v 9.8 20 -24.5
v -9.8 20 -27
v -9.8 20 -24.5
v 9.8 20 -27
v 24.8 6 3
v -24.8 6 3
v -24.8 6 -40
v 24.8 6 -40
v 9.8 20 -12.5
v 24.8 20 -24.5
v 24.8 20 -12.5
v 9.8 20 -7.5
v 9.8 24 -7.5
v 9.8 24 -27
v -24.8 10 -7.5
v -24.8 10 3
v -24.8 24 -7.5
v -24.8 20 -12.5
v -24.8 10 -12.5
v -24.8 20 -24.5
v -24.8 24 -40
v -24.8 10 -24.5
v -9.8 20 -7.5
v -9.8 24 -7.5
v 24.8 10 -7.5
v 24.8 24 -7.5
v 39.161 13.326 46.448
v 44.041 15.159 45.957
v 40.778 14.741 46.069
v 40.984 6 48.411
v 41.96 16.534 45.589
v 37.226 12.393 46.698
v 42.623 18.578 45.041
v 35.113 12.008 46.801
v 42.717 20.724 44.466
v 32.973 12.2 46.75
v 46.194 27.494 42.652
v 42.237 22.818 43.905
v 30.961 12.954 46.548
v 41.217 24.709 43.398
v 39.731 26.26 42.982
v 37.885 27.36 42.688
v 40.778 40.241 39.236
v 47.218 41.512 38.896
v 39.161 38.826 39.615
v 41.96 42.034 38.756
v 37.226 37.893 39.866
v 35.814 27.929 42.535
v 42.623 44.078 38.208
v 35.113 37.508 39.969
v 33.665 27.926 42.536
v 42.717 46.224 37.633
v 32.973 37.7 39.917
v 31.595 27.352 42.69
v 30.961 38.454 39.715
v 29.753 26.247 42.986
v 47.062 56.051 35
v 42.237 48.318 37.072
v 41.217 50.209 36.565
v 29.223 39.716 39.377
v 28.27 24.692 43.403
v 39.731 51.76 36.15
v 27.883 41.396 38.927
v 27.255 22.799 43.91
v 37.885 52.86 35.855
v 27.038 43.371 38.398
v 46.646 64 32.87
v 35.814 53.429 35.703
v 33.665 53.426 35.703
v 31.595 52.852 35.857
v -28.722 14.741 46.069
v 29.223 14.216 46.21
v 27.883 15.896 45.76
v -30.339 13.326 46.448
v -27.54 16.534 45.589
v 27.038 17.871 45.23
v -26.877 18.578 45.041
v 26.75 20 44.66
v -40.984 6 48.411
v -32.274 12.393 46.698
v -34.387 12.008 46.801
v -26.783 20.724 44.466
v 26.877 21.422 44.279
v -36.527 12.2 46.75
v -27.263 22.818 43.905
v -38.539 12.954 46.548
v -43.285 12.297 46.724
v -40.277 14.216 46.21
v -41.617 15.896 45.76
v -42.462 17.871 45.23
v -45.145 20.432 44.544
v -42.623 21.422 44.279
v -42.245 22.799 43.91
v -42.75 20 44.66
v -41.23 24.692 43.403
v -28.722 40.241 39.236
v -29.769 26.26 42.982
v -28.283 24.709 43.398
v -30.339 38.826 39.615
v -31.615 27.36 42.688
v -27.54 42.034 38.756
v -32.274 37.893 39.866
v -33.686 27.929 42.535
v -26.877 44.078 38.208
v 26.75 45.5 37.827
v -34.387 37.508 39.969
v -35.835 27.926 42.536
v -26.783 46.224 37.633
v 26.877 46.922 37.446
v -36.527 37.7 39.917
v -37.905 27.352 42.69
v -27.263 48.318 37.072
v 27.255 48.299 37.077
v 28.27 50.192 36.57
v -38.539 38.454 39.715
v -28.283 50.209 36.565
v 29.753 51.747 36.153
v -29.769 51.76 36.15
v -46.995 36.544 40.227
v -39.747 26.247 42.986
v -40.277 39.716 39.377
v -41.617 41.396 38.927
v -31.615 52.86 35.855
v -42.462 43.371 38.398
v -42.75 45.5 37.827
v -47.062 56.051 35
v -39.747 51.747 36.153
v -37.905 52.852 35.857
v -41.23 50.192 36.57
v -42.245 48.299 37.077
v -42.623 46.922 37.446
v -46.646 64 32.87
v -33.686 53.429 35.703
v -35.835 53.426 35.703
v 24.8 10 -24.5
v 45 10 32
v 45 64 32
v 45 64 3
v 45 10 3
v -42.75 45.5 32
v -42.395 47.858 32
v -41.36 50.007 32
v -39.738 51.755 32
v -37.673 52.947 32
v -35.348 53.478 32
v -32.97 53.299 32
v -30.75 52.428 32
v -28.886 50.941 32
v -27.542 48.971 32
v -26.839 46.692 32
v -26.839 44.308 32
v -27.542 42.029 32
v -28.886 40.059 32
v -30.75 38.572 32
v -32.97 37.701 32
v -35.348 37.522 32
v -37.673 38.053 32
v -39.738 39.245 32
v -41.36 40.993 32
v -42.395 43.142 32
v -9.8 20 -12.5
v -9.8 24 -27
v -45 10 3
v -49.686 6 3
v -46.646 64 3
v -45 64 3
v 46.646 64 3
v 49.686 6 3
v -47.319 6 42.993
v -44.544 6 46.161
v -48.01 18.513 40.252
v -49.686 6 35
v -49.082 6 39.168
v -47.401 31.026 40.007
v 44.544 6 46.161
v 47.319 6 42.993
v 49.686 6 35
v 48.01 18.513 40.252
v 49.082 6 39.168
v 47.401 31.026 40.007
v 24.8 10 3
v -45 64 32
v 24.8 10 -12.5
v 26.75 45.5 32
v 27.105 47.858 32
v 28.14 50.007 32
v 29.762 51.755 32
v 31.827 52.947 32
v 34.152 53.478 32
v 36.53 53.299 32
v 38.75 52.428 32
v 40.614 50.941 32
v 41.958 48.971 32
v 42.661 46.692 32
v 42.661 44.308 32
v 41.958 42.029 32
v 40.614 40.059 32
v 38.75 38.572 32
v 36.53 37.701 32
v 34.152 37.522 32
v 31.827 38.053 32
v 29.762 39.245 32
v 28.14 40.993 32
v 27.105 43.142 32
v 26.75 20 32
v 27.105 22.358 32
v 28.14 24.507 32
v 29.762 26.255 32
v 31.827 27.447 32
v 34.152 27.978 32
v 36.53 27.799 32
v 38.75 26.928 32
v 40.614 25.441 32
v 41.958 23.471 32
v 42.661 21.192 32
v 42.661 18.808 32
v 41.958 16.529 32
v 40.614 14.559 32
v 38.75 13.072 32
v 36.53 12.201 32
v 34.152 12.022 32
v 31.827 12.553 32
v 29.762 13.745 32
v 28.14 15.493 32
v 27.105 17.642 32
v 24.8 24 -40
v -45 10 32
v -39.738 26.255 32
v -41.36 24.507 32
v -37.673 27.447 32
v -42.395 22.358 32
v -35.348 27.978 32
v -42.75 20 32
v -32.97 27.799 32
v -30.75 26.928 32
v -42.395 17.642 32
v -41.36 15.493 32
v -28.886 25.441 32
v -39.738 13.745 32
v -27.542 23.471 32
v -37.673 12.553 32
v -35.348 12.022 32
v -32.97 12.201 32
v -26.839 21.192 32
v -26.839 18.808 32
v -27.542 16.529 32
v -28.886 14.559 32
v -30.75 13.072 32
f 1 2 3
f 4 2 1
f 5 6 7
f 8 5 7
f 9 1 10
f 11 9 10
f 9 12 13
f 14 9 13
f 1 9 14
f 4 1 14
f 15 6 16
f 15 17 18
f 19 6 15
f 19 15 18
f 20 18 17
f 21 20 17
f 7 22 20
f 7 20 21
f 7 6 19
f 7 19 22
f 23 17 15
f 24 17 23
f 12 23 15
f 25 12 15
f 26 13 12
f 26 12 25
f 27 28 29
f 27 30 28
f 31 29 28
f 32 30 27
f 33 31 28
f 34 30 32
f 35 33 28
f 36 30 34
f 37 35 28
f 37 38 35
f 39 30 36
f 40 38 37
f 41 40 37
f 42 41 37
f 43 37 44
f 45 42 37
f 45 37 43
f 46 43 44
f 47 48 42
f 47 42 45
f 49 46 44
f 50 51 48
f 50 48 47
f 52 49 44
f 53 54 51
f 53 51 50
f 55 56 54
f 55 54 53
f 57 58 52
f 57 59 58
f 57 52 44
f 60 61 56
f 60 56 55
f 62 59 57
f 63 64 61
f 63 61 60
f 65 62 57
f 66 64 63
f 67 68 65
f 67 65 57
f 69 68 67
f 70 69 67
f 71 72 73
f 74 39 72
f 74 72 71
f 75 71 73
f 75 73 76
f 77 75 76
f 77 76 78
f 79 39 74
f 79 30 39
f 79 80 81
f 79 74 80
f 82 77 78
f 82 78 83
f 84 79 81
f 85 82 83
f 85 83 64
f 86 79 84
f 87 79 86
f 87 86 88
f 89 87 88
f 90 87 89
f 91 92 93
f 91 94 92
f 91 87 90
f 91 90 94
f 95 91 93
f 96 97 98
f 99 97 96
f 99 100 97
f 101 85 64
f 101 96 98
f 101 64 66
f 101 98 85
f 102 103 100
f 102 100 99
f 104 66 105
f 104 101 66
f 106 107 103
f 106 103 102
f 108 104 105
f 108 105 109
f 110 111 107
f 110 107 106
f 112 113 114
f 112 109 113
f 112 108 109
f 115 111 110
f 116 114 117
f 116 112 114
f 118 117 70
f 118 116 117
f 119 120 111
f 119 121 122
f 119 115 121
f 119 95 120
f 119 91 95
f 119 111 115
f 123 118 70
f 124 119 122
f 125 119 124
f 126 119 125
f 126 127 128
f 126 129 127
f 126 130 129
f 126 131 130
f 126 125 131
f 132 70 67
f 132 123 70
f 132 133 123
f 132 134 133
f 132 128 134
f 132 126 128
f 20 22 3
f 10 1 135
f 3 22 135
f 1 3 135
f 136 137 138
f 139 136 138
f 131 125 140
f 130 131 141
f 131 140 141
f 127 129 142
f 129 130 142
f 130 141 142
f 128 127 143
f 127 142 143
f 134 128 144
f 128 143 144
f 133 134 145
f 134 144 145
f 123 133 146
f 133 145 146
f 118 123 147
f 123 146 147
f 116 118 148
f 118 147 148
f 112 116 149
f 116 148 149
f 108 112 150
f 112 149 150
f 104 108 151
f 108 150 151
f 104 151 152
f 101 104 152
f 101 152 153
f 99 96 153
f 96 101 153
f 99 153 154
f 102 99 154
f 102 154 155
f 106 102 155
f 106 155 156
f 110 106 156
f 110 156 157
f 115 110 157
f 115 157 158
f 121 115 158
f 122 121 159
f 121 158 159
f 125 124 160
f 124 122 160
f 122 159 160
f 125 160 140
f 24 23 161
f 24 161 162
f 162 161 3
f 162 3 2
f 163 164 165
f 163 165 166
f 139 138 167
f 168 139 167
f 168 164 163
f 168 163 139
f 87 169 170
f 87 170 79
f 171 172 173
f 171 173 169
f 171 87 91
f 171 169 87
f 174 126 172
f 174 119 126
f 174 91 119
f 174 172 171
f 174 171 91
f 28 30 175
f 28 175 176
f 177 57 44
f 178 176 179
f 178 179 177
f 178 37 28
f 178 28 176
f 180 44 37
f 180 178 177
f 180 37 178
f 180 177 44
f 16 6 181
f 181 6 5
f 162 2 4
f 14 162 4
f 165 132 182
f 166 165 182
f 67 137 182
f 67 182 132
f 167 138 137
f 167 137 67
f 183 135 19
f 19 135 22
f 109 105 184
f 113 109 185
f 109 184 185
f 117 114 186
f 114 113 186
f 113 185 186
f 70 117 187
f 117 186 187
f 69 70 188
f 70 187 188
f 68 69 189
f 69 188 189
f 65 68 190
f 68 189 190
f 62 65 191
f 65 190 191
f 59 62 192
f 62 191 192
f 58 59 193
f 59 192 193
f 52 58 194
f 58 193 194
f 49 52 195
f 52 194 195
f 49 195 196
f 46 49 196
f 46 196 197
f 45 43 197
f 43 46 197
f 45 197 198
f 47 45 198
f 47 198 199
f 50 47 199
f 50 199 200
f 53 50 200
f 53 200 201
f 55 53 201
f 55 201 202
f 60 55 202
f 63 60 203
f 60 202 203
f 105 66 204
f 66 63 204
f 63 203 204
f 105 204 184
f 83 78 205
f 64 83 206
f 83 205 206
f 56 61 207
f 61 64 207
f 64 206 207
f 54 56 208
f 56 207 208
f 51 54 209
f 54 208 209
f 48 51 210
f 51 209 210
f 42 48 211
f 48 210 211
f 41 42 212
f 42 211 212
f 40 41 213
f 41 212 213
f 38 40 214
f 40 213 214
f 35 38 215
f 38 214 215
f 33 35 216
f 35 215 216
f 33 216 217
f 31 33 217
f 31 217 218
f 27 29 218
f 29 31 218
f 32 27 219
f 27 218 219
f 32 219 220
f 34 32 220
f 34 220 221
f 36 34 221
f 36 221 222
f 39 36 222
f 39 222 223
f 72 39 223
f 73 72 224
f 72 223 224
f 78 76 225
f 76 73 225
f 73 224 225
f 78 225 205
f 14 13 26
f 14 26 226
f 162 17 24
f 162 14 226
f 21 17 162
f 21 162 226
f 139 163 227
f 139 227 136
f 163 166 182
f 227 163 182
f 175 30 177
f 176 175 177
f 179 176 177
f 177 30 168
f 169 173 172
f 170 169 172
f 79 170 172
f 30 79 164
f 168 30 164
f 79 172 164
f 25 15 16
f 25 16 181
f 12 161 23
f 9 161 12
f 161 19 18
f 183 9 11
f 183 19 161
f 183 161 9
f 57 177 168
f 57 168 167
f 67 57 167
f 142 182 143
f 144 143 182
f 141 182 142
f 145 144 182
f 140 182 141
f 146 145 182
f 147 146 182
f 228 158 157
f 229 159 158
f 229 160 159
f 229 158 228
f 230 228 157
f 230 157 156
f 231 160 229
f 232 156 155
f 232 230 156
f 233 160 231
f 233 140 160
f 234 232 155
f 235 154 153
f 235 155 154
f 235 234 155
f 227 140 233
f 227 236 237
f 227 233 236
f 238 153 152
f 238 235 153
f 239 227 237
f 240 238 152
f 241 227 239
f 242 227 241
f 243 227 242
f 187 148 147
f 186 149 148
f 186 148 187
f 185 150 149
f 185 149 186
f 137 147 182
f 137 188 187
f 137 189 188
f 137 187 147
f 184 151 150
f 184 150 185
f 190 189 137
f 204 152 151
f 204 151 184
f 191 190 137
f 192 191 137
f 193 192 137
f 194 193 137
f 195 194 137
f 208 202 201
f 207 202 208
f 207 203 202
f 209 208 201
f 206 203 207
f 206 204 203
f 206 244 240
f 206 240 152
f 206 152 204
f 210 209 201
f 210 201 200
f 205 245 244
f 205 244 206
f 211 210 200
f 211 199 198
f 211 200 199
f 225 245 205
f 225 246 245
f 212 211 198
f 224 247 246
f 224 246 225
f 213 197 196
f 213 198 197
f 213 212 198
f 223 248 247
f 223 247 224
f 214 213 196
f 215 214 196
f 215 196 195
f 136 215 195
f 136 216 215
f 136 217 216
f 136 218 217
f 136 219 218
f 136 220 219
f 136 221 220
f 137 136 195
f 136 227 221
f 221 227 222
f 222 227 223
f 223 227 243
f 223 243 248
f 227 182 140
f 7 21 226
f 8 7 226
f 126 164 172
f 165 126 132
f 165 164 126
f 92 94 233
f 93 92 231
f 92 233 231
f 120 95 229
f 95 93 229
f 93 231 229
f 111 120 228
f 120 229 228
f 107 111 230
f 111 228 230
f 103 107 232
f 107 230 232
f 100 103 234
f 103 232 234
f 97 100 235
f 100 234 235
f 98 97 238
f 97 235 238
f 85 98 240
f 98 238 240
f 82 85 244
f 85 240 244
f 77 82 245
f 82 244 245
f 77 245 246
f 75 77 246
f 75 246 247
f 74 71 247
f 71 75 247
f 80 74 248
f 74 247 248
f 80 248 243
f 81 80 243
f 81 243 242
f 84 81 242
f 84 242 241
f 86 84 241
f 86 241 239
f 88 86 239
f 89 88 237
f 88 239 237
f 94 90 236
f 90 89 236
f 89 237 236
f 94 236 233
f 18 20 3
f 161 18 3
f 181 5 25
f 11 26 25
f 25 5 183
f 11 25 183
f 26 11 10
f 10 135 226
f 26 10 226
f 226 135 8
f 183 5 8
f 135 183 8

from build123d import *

# Parameters (mm, degrees)
BOSS_EXTRUDE1_DEPTH      = 10
SKETCH2_W                = 17.2
SKETCH2_H                = 43
CUT_EXTRUDE1_DEPTH       = 72.414284285
SKETCH3_W                = 90
SKETCH3_H                = 34
SKETCH3_W_2              = 80
SKETCH3_H_2              = 24
BOSS_EXTRUDE3_DEPTH      = 15
SKETCH4_W                = 49.6
SKETCH4_H                = 5
BOSS_EXTRUDE4_DEPTH      = 10
SKETCH5_W                = 15
SKETCH5_H                = 22
BOSS_EXTRUDE5_DEPTH      = 5
SKETCH6_W                = 90
SKETCH6_H                = 77
BOSS_EXTRUDE6_DEPTH      = 15
BOSS_EXTRUDE8_DEPTH      = 39
CHAMFER1_SIZE            = 64
CHAMFER1_SIZE_2          = 3.354097874
CHAMFER3_SIZE            = 64
CHAMFER3_SIZE_2          = 13.775745352
CUT_EXTRUDE6_DEPTH       = 2.5
CUT_EXTRUDE8_DEPTH       = 15
CUT_EXTRUDE9_DEPTH       = 15
SKETCH22_W               = 30
SKETCH22_H               = 7
CUT_EXTRUDE10_DEPTH      = 10
SKETCH25_R               = 8
CUT_EXTRUDE19_DEPTH      = 116.41230437
SKETCH29_W               = 9
SKETCH29_H               = 29
BOSS_EXTRUDE10_DEPTH     = 28
SKETCH31_W               = 49.6
SKETCH31_H               = 13
BOSS_EXTRUDE12_DEPTH     = 28
SKETCH30_W               = 49.6
SKETCH30_H               = 4
SKETCH30_W_2             = 48
BOSS_EXTRUDE11_DEPTH     = 10
SKETCH33_W               = 15
SKETCH33_H               = 19.5
BOSS_EXTRUDE13_DEPTH     = 13
SKETCH23_W               = 30
SKETCH23_H               = 28.995403325
CUT_EXTRUDE17_DEPTH      = 5
SKETCH34_W               = 9.8
SKETCH34_H               = 10.5
BOSS_EXTRUDE14_DEPTH     = 28
SKETCH35_W               = 30
SKETCH35_H               = 10.5
CUT_EXTRUDE22_DEPTH      = 5
SKETCH37_W               = 30
SKETCH37_H               = 32.5
BOSS_EXTRUDE15_DEPTH     = 5
SKETCH38_W               = 100
SKETCH38_H               = 20
CUT_EXTRUDE23_DEPTH      = 64
SKETCH39_W               = 8
SKETCH39_H               = 43
CUT_EXTRUDE24_DEPTH      = 64
CUT_EXTRUDE25_REACH      = 111.873
SKETCH40_W               = 23
SKETCH40_H               = 22
CUT_EXTRUDE26_DEPTH      = 62
SKETCH42_W               = 48
SKETCH42_H               = 29
CUT_EXTRUDE27_DEPTH      = 28
CUT_EXTRUDE28_DEPTH      = 111.413042708
CUT_EXTRUDE28_DEPTH_BACK = 111.413042708
SKETCH43_W               = 90
SKETCH43_H               = 6
CUT_EXTRUDE29_DEPTH      = 110.488551462
CUT_EXTRUDE29_DEPTH_BACK = 110.488551462
SKETCH44_W               = 43
SKETCH44_H               = 24
SKETCH45_W               = 30
SKETCH45_H               = 7
BOSS_EXTRUDE16_DEPTH     = 4
SKETCH46_W               = 49.6
SKETCH46_H               = 10.5
CUT_EXTRUDE30_DEPTH      = 14
SPLIT1_SURFACE_1_BACK    = 146.104
SPLIT1_SURFACE_1_DEPTH   = 292.208
SPLIT1_SURFACE_2_BACK    = 146.104
SPLIT1_SURFACE_2_DEPTH   = 292.208


with BuildPart() as part:
    # Sketch1 → Boss-Extrude1 (new body)
    with BuildSketch(Plane(origin=(0, 0, 0), x_dir=(1, 0, 0), z_dir=(0, 1, 0))):
        with BuildLine():
            Line((-35, 50), (35, 50))
            ThreePointArc((35, 50), (45.606601718, 45.606601718), (50, 35))
            Line((50, 35), (50, -35))
            ThreePointArc((50, -35), (45.606601718, -45.606601718), (35, -50))
            Line((35, -50), (-35, -50))
            ThreePointArc((-35, -50), (-45.606601718, -45.606601718), (-50, -35))
            Line((-50, -35), (-50, 35))
            ThreePointArc((-50, 35), (-45.606601718, 45.606601718), (-35, 50))
        make_face()
    extrude(amount=BOSS_EXTRUDE1_DEPTH)

    # Sketch2 → Cut-Extrude1 (cut, through all)
    with BuildSketch(Plane(origin=(0, 10, 0), x_dir=(1, 0, 0), z_dir=(0, 1, 0))):
        with Locations((-33.4, 18.5)):
            Rectangle(SKETCH2_W, SKETCH2_H)
        with Locations((33.4, 18.5)):
            Rectangle(SKETCH2_W, SKETCH2_H)
    extrude(amount=-CUT_EXTRUDE1_DEPTH, mode=Mode.SUBTRACT)

    # Sketch3 → Boss-Extrude3 (add)
    with BuildSketch(Plane(origin=(0, 10, 0), x_dir=(1, 0, 0), z_dir=(0, 1, 0))):
        with Locations((0, -20)):
            Rectangle(SKETCH3_W, SKETCH3_H)
        with Locations((0, -20)):
            Rectangle(SKETCH3_W_2, SKETCH3_H_2, mode=Mode.SUBTRACT)
    extrude(amount=BOSS_EXTRUDE3_DEPTH)

    # Sketch4 → Boss-Extrude4 (add)
    with BuildSketch(Plane(origin=(0, 10, 0), x_dir=(1, 0, 0), z_dir=(0, 1, 0))):
        with Locations((0, 10)):
            Rectangle(SKETCH4_W, SKETCH4_H)
        with Locations((0, 27)):
            Rectangle(SKETCH4_W, SKETCH4_H)
    extrude(amount=BOSS_EXTRUDE4_DEPTH)

    # Sketch5 → Boss-Extrude5 (add)
    with BuildSketch(Plane(origin=(0, 20, 0), x_dir=(1, 0, 0), z_dir=(0, 1, 0))):
        with Locations((-17.3, 18.5)):
            Rectangle(SKETCH5_W, SKETCH5_H)
        with Locations((17.3, 18.5)):
            Rectangle(SKETCH5_W, SKETCH5_H)
    extrude(amount=BOSS_EXTRUDE5_DEPTH)

    # Sketch6 → Boss-Extrude6 (add)
    with BuildSketch(Plane(origin=(0, 10, 0), x_dir=(1, 0, 0), z_dir=(0, 1, 0))):
        with BuildLine():
            Line((-50, 35), (-50, -35))
            ThreePointArc((-50, -35), (-45.606601718, -45.606601718), (-35, -50))
            Line((-35, -50), (35, -50))
            ThreePointArc((35, -50), (45.606601718, -45.606601718), (50, -35))
            Line((50, -35), (50, 35))
            ThreePointArc((50, 35), (45.606601718, 45.606601718), (35, 50))
            Line((35, 50), (-35, 50))
            ThreePointArc((-35, 50), (-45.606601718, 45.606601718), (-50, 35))
        make_face()
        with Locations((0, 1.5)):
            Rectangle(SKETCH6_W, SKETCH6_H, mode=Mode.SUBTRACT)
    extrude(amount=BOSS_EXTRUDE6_DEPTH)

    # Sketch9 → Boss-Extrude8 (add)
    with BuildSketch(Plane(origin=(0, 25, 0), x_dir=(1, 0, 0), z_dir=(0, 1, 0))):
        with BuildLine():
            Line((-50, 35), (-50, -35))
            ThreePointArc((-50, -35), (-45.606601718, -45.606601718), (-35, -50))
            Line((-35, -50), (35, -50))
            ThreePointArc((35, -50), (45.606601718, -45.606601718), (50, -35))
            Line((50, -35), (50, 35))
            ThreePointArc((50, 35), (45.606601718, 45.606601718), (35, 50))
            Line((35, 50), (-35, 50))
            ThreePointArc((-35, 50), (-45.606601718, 45.606601718), (-50, 35))
        make_face()
        with BuildLine():
            Line((-45, 35), (-45, -32))
            Line((-45, -32), (45, -32))
            Line((45, -32), (45, 35))
            ThreePointArc((45, 35), (44.659258263, 37.588190451), (43.660254038, 40))
            Line((43.660254038, 40), (-43.660254038, 40))
            ThreePointArc((-43.660254038, 40), (-44.659258263, 37.588190451), (-45, 35))
        make_face(mode=Mode.SUBTRACT)
    extrude(amount=BOSS_EXTRUDE8_DEPTH)

    # Chamfer1
    # the kernel refuses this chamfer: 64, 3.354097874 mm, written as the material it takes off along each edge
    with BuildSketch(Plane(origin=(-35, 64, 50), x_dir=(0, -0.9999979738662979, 0.002013023422382214), z_dir=(1, 0, 0)), Plane(origin=(50, 64, 35), x_dir=(0.002013023422382214, -0.9999979738662979, 0), z_dir=(0, 0, -1)), Plane(origin=(-50, 64, -35), x_dir=(-0.002013023422382214, -0.9999979738662979, 0), z_dir=(0, 0, 1)), Plane(origin=(35, 64, -50), x_dir=(0, -0.9999979738662979, -0.002013023422382214), z_dir=(-1, 0, 0))) as chamfer1_piece_1:
        Polygon((CHAMFER1_SIZE * 0.999997973866, CHAMFER1_SIZE * 0.00201302342238), (-CHAMFER1_SIZE_2 * 0.00201302342245, CHAMFER1_SIZE_2 * 0.9999979739), (0, 0), align=None)
    extrude(amount=70, mode=Mode.SUBTRACT)
    with BuildSketch(Plane(origin=(35, 64, 35), x_dir=(0, 0, 1), z_dir=(-1, 0, 0))) as chamfer1_piece_2:
        Polygon((15, -CHAMFER1_SIZE), (15 - CHAMFER1_SIZE_2, 0), (15, 0), align=None)
    revolve(axis=Axis((35, 64, 35), (0, 1, 0)), revolution_arc=90, mode=Mode.SUBTRACT)
    with BuildSketch(Plane(origin=(-35, 64, 35), x_dir=(-1, 0, 0), z_dir=(0, 0, -1))) as chamfer1_piece_3:
        Polygon((15, -CHAMFER1_SIZE), (15 - CHAMFER1_SIZE_2, 0), (15, 0), align=None)
    revolve(axis=Axis((-35, 64, 35), (0, 1, 0)), revolution_arc=90, mode=Mode.SUBTRACT)
    with BuildSketch(Plane(origin=(35, 64, -35), x_dir=(1, 0, 0), z_dir=(0, 0, 1))) as chamfer1_piece_4:
        Polygon((15, -CHAMFER1_SIZE), (15 - CHAMFER1_SIZE_2, 0), (15, 0), align=None)
    revolve(axis=Axis((35, 64, -35), (0, 1, 0)), revolution_arc=90, mode=Mode.SUBTRACT)
    with BuildSketch(Plane(origin=(-35, 64, -35), x_dir=(0, 0, -1), z_dir=(1, 0, 0))) as chamfer1_piece_5:
        Polygon((15 - CHAMFER1_SIZE_2, 0), (15, -CHAMFER1_SIZE), (15, 0), align=None)
    revolve(axis=Axis((-35, 64, -35), (0, 1, 0)), revolution_arc=90, mode=Mode.SUBTRACT)

    # Chamfer3
    # the kernel refuses this chamfer: 64, 13.775745352 mm, written as the material it takes off along each edge
    with BuildSketch(Plane(origin=(-201.265469314, 64, 46.645902126), x_dir=(0, -0.9981787050157903, 0.06032638604292662), z_dir=(1, 0, 0))) as chamfer3_piece_1:
        Polygon((CHAMFER3_SIZE * 0.999967974892, CHAMFER3_SIZE * 0.00800307379952), (-CHAMFER3_SIZE_2 * 0.060326386045, CHAMFER3_SIZE_2 * 0.99817870505), (0, 0), align=None)
    extrude(amount=402.530938629, mode=Mode.SUBTRACT)

    # Sketch17 → Cut-Extrude6 (cut)
    with BuildSketch(Plane(origin=(0, 0, -29.5), x_dir=(-1, 0, 0), z_dir=(0, 0, -1))):
        Polygon((-24.8, 10), (24.8, 10), (24.8, 25), (9.8, 25), (9.8, 20), (-9.8, 20), (-9.8, 25), (-24.8, 25), align=None)
    extrude(amount=-CUT_EXTRUDE6_DEPTH, mode=Mode.SUBTRACT)

    # Sketch20 → Cut-Extrude8 (cut)
    with BuildSketch(Plane.XZ.offset(-25)):
        with BuildLine():
            Line((-45, -35), (-45, -40))
            Line((-45, -40), (-43.660254038, -40))
            ThreePointArc((-43.660254038, -40), (-44.659258263, -37.588190451), (-45, -35))
        make_face()
        with BuildLine():
            Line((45, -40), (45, -35))
            ThreePointArc((45, -35), (44.659258263, -37.588190451), (43.660254038, -40))
            Line((43.660254038, -40), (45, -40))
        make_face()
    extrude(amount=-CUT_EXTRUDE8_DEPTH, mode=Mode.SUBTRACT)

    # Sketch21 → Cut-Extrude9 (cut)
    with BuildSketch(Plane(origin=(0, 25, 0), x_dir=(1, 0, 0), z_dir=(0, 1, 0))):
        Polygon((40, -8), (40, -32), (45, -32), (45, -3), (-45, -3), (-45, -32), (-40, -32), (-40, -8), align=None)
    extrude(amount=-CUT_EXTRUDE9_DEPTH, mode=Mode.SUBTRACT)

    # Sketch22 → Cut-Extrude10 (cut)
    with BuildSketch(Plane.XZ):
        with Locations((0, 28.5)):
            Rectangle(SKETCH22_W, SKETCH22_H)
    extrude(amount=-CUT_EXTRUDE10_DEPTH, mode=Mode.SUBTRACT)

    # Sketch25 → Cut-Extrude19 (cut, through all)
    with BuildSketch(Plane(origin=(0, 0, 32), x_dir=(-1, 0, 0), z_dir=(0, 0, -1))):
        with Locations((-34.75, 45.5)):
            Circle(SKETCH25_R)
        with Locations((34.75, 45.5)):
            Circle(SKETCH25_R)
        with Locations((-34.75, 20)):
            Circle(SKETCH25_R)
        with Locations((34.75, 20)):
            Circle(SKETCH25_R)
    extrude(amount=-CUT_EXTRUDE19_DEPTH, mode=Mode.SUBTRACT)

    # Sketch29 → Boss-Extrude10 (add)
    with BuildSketch(Plane(origin=(0, 10, 0), x_dir=(1, 0, 0), z_dir=(0, 1, 0))):
        with Locations((-19.5, -17.5)):
            Rectangle(SKETCH29_W, SKETCH29_H)
        with Locations((19.5, -17.5)):
            Rectangle(SKETCH29_W, SKETCH29_H)
    extrude(amount=BOSS_EXTRUDE10_DEPTH)

    # Sketch31 → Boss-Extrude12 (add)
    with BuildSketch(Plane(origin=(0, 10, 0), x_dir=(1, 0, 0), z_dir=(0, 1, 0))):
        with Locations((0, 33.5)):
            Rectangle(SKETCH31_W, SKETCH31_H)
    extrude(amount=BOSS_EXTRUDE12_DEPTH)

    # Sketch30 → Boss-Extrude11 (add)
    with BuildSketch(Plane(origin=(0, 38, 0), x_dir=(1, 0, 0), z_dir=(0, 1, 0))):
        with Locations((0, 38)):
            Rectangle(SKETCH30_W, SKETCH30_H)
        with Locations((0, -20)):
            Rectangle(SKETCH30_W_2, SKETCH30_H)
    extrude(amount=BOSS_EXTRUDE11_DEPTH)

    # Sketch33 → Boss-Extrude13 (add)
    with BuildSketch(Plane(origin=(0, 25, 0), x_dir=(1, 0, 0), z_dir=(0, 1, 0))):
        with Locations((17.3, 17.25)):
            Rectangle(SKETCH33_W, SKETCH33_H)
        with Locations((-17.3, 17.25)):
            Rectangle(SKETCH33_W, SKETCH33_H)
    extrude(amount=BOSS_EXTRUDE13_DEPTH)

    # Sketch23 → Cut-Extrude17 (cut)
    with BuildSketch(Plane(origin=(0, 10, 0), x_dir=(1, 0, 0), z_dir=(0, 1, 0))):
        with Locations((0, -17.497701662)):
            Rectangle(SKETCH23_W, SKETCH23_H)
    extrude(amount=-CUT_EXTRUDE17_DEPTH, mode=Mode.SUBTRACT)

    # Sketch34 → Boss-Extrude14 (add)
    with BuildSketch(Plane(origin=(0, 10, 0), x_dir=(1, 0, 0), z_dir=(0, 1, 0))):
        with Locations((-19.9, 2.25)):
            Rectangle(SKETCH34_W, SKETCH34_H)
        with Locations((19.9, 2.25)):
            Rectangle(SKETCH34_W, SKETCH34_H)
    extrude(amount=BOSS_EXTRUDE14_DEPTH)

    # Sketch35 → Cut-Extrude22 (cut)
    with BuildSketch(Plane(origin=(0, 10, 0), x_dir=(1, 0, 0), z_dir=(0, 1, 0))):
        with Locations((0, 2.25)):
            Rectangle(SKETCH35_W, SKETCH35_H)
    extrude(amount=-CUT_EXTRUDE22_DEPTH, mode=Mode.SUBTRACT)

    # Sketch37 → Boss-Extrude15 (add)
    with BuildSketch(Plane(origin=(0, 5, 0), x_dir=(1, 0, 0), z_dir=(0, 1, 0))):
        with Locations((0, -8.75)):
            Rectangle(SKETCH37_W, SKETCH37_H)
    extrude(amount=BOSS_EXTRUDE15_DEPTH)

    # Sketch38 → Cut-Extrude23 (cut)
    with BuildSketch(Plane(origin=(0, 64, 0), x_dir=(1, 0, 0), z_dir=(0, 1, 0))):
        with Locations((0, 50)):
            Rectangle(SKETCH38_W, SKETCH38_H)
    extrude(amount=-CUT_EXTRUDE23_DEPTH, mode=Mode.SUBTRACT)

    # Sketch39 → Cut-Extrude24 (cut)
    with BuildSketch(Plane.XZ):
        with Locations((-46, -18.5)):
            Rectangle(SKETCH39_W, SKETCH39_H)
        with Locations((46, -18.5)):
            Rectangle(SKETCH39_W, SKETCH39_H)
    extrude(amount=-CUT_EXTRUDE24_DEPTH, mode=Mode.SUBTRACT)

    # Cut-Extrude25: up to this face of the body (flat: up to its plane)
    cut_extrude25_end = Plane(part.part.faces().sort_by_distance((24, 24.892018779, 17.617370892))[0])
    # Sketch40 → Cut-Extrude25 (cut, up to the picked face)
    with BuildSketch(Plane.ZY.offset(24), mode=Mode.PRIVATE) as cut_extrude25_sk1:
        with Locations((17.5, 24)):
            Rectangle(SKETCH40_W, SKETCH40_H)
    cut_extrude25_tool1 = split(extrude(cut_extrude25_sk1.sketch, amount=-CUT_EXTRUDE25_REACH, mode=Mode.PRIVATE), bisect_by=cut_extrude25_end, keep=Keep.BOTH, mode=Mode.PRIVATE)
    add(cut_extrude25_tool1.solids().sort_by(Axis((-24, 24, 17.5), (1, 0, 0)))[0], mode=Mode.SUBTRACT)

    # Sketch41 → Cut-Extrude26 (cut)
    with BuildSketch(Plane.XY.offset(22)):
        Polygon((-24, 38), (-15, 38), (15, 38), (24, 38), (24, 48), (-24, 48), align=None)
    extrude(amount=-CUT_EXTRUDE26_DEPTH, mode=Mode.SUBTRACT)

    # Sketch42 → Cut-Extrude27 (cut)
    with BuildSketch(Plane(origin=(0, 38, 0), x_dir=(1, 0, 0), z_dir=(0, 1, 0))):
        with Locations((0, -17.5)):
            Rectangle(SKETCH42_W, SKETCH42_H)
    extrude(amount=-CUT_EXTRUDE27_DEPTH, mode=Mode.SUBTRACT)

    # Sketch43 → Cut-Extrude28 (cut, two sides: drawn at the far end of the back side and taken through both)
    with BuildSketch(Plane(origin=(24.8, 0, 0), x_dir=(0, 0, -1), z_dir=(1, 0, 0)).offset(-CUT_EXTRUDE28_DEPTH_BACK)):
        with Locations((-5, 3)):
            Rectangle(SKETCH43_W, SKETCH43_H)
    extrude(amount=CUT_EXTRUDE28_DEPTH + CUT_EXTRUDE28_DEPTH_BACK, mode=Mode.SUBTRACT)

    # Sketch44 → Cut-Extrude29 (cut, two sides: drawn at the far end of the back side and taken through both)
    with BuildSketch(Plane(origin=(24.8, 0, 0), x_dir=(0, 0, -1), z_dir=(1, 0, 0)).offset(-CUT_EXTRUDE29_DEPTH_BACK)):
        with Locations((18.5, 36)):
            Rectangle(SKETCH44_W, SKETCH44_H)
    extrude(amount=CUT_EXTRUDE29_DEPTH + CUT_EXTRUDE29_DEPTH_BACK, mode=Mode.SUBTRACT)

    # Sketch45 → Boss-Extrude16 (add)
    with BuildSketch(Plane(origin=(0, 10, 0), x_dir=(1, 0, 0), z_dir=(0, 1, 0))):
        with Locations((0, -28.5)):
            Rectangle(SKETCH45_W, SKETCH45_H)
    extrude(amount=-BOSS_EXTRUDE16_DEPTH)

    # Sketch46 → Cut-Extrude30 (cut)
    with BuildSketch(Plane(origin=(0, 24, 0), x_dir=(1, 0, 0), z_dir=(0, 1, 0))):
        with Locations((0, 2.25)):
            Rectangle(SKETCH46_W, SKETCH46_H)
    extrude(amount=-CUT_EXTRUDE30_DEPTH, mode=Mode.SUBTRACT)


with BuildPart() as body_2:
    # Split1: the piece behind the surface
    add(part.part)
    # Split1 surface: a surface, the sketch's curves swept straight by 292.208 mm
    with BuildLine(Plane(origin=(0, 10, 0), x_dir=(1, 0, 0), z_dir=(0, 1, 0)).offset(-SPLIT1_SURFACE_1_BACK), mode=Mode.PRIVATE) as split1_surface_1_path:
        Line((-24.8, -3), (24.8, -3))
    split1_surface_1 = Shell.extrude(split1_surface_1_path.wire(), (0 * SPLIT1_SURFACE_1_DEPTH, 1 * SPLIT1_SURFACE_1_DEPTH, 0 * SPLIT1_SURFACE_1_DEPTH))
    split(bisect_by=split1_surface_1, keep=Keep.BOTTOM)


with BuildPart() as part_1:
    add(part.part)

    # Split1: split by a surface, the side it looks to stays
    # Split1 surface: a surface, the sketch's curves swept straight by 292.208 mm
    with BuildLine(Plane(origin=(0, 10, 0), x_dir=(1, 0, 0), z_dir=(0, 1, 0)).offset(-SPLIT1_SURFACE_2_BACK), mode=Mode.PRIVATE) as split1_surface_2_path:
        Line((-24.8, -3), (24.8, -3))
    split1_surface_2 = Shell.extrude(split1_surface_2_path.wire(), (0 * SPLIT1_SURFACE_2_DEPTH, 1 * SPLIT1_SURFACE_2_DEPTH, 0 * SPLIT1_SURFACE_2_DEPTH))
    split(bisect_by=split1_surface_2, keep=Keep.TOP)


solid = Compound([body_2.part, part_1.part])
